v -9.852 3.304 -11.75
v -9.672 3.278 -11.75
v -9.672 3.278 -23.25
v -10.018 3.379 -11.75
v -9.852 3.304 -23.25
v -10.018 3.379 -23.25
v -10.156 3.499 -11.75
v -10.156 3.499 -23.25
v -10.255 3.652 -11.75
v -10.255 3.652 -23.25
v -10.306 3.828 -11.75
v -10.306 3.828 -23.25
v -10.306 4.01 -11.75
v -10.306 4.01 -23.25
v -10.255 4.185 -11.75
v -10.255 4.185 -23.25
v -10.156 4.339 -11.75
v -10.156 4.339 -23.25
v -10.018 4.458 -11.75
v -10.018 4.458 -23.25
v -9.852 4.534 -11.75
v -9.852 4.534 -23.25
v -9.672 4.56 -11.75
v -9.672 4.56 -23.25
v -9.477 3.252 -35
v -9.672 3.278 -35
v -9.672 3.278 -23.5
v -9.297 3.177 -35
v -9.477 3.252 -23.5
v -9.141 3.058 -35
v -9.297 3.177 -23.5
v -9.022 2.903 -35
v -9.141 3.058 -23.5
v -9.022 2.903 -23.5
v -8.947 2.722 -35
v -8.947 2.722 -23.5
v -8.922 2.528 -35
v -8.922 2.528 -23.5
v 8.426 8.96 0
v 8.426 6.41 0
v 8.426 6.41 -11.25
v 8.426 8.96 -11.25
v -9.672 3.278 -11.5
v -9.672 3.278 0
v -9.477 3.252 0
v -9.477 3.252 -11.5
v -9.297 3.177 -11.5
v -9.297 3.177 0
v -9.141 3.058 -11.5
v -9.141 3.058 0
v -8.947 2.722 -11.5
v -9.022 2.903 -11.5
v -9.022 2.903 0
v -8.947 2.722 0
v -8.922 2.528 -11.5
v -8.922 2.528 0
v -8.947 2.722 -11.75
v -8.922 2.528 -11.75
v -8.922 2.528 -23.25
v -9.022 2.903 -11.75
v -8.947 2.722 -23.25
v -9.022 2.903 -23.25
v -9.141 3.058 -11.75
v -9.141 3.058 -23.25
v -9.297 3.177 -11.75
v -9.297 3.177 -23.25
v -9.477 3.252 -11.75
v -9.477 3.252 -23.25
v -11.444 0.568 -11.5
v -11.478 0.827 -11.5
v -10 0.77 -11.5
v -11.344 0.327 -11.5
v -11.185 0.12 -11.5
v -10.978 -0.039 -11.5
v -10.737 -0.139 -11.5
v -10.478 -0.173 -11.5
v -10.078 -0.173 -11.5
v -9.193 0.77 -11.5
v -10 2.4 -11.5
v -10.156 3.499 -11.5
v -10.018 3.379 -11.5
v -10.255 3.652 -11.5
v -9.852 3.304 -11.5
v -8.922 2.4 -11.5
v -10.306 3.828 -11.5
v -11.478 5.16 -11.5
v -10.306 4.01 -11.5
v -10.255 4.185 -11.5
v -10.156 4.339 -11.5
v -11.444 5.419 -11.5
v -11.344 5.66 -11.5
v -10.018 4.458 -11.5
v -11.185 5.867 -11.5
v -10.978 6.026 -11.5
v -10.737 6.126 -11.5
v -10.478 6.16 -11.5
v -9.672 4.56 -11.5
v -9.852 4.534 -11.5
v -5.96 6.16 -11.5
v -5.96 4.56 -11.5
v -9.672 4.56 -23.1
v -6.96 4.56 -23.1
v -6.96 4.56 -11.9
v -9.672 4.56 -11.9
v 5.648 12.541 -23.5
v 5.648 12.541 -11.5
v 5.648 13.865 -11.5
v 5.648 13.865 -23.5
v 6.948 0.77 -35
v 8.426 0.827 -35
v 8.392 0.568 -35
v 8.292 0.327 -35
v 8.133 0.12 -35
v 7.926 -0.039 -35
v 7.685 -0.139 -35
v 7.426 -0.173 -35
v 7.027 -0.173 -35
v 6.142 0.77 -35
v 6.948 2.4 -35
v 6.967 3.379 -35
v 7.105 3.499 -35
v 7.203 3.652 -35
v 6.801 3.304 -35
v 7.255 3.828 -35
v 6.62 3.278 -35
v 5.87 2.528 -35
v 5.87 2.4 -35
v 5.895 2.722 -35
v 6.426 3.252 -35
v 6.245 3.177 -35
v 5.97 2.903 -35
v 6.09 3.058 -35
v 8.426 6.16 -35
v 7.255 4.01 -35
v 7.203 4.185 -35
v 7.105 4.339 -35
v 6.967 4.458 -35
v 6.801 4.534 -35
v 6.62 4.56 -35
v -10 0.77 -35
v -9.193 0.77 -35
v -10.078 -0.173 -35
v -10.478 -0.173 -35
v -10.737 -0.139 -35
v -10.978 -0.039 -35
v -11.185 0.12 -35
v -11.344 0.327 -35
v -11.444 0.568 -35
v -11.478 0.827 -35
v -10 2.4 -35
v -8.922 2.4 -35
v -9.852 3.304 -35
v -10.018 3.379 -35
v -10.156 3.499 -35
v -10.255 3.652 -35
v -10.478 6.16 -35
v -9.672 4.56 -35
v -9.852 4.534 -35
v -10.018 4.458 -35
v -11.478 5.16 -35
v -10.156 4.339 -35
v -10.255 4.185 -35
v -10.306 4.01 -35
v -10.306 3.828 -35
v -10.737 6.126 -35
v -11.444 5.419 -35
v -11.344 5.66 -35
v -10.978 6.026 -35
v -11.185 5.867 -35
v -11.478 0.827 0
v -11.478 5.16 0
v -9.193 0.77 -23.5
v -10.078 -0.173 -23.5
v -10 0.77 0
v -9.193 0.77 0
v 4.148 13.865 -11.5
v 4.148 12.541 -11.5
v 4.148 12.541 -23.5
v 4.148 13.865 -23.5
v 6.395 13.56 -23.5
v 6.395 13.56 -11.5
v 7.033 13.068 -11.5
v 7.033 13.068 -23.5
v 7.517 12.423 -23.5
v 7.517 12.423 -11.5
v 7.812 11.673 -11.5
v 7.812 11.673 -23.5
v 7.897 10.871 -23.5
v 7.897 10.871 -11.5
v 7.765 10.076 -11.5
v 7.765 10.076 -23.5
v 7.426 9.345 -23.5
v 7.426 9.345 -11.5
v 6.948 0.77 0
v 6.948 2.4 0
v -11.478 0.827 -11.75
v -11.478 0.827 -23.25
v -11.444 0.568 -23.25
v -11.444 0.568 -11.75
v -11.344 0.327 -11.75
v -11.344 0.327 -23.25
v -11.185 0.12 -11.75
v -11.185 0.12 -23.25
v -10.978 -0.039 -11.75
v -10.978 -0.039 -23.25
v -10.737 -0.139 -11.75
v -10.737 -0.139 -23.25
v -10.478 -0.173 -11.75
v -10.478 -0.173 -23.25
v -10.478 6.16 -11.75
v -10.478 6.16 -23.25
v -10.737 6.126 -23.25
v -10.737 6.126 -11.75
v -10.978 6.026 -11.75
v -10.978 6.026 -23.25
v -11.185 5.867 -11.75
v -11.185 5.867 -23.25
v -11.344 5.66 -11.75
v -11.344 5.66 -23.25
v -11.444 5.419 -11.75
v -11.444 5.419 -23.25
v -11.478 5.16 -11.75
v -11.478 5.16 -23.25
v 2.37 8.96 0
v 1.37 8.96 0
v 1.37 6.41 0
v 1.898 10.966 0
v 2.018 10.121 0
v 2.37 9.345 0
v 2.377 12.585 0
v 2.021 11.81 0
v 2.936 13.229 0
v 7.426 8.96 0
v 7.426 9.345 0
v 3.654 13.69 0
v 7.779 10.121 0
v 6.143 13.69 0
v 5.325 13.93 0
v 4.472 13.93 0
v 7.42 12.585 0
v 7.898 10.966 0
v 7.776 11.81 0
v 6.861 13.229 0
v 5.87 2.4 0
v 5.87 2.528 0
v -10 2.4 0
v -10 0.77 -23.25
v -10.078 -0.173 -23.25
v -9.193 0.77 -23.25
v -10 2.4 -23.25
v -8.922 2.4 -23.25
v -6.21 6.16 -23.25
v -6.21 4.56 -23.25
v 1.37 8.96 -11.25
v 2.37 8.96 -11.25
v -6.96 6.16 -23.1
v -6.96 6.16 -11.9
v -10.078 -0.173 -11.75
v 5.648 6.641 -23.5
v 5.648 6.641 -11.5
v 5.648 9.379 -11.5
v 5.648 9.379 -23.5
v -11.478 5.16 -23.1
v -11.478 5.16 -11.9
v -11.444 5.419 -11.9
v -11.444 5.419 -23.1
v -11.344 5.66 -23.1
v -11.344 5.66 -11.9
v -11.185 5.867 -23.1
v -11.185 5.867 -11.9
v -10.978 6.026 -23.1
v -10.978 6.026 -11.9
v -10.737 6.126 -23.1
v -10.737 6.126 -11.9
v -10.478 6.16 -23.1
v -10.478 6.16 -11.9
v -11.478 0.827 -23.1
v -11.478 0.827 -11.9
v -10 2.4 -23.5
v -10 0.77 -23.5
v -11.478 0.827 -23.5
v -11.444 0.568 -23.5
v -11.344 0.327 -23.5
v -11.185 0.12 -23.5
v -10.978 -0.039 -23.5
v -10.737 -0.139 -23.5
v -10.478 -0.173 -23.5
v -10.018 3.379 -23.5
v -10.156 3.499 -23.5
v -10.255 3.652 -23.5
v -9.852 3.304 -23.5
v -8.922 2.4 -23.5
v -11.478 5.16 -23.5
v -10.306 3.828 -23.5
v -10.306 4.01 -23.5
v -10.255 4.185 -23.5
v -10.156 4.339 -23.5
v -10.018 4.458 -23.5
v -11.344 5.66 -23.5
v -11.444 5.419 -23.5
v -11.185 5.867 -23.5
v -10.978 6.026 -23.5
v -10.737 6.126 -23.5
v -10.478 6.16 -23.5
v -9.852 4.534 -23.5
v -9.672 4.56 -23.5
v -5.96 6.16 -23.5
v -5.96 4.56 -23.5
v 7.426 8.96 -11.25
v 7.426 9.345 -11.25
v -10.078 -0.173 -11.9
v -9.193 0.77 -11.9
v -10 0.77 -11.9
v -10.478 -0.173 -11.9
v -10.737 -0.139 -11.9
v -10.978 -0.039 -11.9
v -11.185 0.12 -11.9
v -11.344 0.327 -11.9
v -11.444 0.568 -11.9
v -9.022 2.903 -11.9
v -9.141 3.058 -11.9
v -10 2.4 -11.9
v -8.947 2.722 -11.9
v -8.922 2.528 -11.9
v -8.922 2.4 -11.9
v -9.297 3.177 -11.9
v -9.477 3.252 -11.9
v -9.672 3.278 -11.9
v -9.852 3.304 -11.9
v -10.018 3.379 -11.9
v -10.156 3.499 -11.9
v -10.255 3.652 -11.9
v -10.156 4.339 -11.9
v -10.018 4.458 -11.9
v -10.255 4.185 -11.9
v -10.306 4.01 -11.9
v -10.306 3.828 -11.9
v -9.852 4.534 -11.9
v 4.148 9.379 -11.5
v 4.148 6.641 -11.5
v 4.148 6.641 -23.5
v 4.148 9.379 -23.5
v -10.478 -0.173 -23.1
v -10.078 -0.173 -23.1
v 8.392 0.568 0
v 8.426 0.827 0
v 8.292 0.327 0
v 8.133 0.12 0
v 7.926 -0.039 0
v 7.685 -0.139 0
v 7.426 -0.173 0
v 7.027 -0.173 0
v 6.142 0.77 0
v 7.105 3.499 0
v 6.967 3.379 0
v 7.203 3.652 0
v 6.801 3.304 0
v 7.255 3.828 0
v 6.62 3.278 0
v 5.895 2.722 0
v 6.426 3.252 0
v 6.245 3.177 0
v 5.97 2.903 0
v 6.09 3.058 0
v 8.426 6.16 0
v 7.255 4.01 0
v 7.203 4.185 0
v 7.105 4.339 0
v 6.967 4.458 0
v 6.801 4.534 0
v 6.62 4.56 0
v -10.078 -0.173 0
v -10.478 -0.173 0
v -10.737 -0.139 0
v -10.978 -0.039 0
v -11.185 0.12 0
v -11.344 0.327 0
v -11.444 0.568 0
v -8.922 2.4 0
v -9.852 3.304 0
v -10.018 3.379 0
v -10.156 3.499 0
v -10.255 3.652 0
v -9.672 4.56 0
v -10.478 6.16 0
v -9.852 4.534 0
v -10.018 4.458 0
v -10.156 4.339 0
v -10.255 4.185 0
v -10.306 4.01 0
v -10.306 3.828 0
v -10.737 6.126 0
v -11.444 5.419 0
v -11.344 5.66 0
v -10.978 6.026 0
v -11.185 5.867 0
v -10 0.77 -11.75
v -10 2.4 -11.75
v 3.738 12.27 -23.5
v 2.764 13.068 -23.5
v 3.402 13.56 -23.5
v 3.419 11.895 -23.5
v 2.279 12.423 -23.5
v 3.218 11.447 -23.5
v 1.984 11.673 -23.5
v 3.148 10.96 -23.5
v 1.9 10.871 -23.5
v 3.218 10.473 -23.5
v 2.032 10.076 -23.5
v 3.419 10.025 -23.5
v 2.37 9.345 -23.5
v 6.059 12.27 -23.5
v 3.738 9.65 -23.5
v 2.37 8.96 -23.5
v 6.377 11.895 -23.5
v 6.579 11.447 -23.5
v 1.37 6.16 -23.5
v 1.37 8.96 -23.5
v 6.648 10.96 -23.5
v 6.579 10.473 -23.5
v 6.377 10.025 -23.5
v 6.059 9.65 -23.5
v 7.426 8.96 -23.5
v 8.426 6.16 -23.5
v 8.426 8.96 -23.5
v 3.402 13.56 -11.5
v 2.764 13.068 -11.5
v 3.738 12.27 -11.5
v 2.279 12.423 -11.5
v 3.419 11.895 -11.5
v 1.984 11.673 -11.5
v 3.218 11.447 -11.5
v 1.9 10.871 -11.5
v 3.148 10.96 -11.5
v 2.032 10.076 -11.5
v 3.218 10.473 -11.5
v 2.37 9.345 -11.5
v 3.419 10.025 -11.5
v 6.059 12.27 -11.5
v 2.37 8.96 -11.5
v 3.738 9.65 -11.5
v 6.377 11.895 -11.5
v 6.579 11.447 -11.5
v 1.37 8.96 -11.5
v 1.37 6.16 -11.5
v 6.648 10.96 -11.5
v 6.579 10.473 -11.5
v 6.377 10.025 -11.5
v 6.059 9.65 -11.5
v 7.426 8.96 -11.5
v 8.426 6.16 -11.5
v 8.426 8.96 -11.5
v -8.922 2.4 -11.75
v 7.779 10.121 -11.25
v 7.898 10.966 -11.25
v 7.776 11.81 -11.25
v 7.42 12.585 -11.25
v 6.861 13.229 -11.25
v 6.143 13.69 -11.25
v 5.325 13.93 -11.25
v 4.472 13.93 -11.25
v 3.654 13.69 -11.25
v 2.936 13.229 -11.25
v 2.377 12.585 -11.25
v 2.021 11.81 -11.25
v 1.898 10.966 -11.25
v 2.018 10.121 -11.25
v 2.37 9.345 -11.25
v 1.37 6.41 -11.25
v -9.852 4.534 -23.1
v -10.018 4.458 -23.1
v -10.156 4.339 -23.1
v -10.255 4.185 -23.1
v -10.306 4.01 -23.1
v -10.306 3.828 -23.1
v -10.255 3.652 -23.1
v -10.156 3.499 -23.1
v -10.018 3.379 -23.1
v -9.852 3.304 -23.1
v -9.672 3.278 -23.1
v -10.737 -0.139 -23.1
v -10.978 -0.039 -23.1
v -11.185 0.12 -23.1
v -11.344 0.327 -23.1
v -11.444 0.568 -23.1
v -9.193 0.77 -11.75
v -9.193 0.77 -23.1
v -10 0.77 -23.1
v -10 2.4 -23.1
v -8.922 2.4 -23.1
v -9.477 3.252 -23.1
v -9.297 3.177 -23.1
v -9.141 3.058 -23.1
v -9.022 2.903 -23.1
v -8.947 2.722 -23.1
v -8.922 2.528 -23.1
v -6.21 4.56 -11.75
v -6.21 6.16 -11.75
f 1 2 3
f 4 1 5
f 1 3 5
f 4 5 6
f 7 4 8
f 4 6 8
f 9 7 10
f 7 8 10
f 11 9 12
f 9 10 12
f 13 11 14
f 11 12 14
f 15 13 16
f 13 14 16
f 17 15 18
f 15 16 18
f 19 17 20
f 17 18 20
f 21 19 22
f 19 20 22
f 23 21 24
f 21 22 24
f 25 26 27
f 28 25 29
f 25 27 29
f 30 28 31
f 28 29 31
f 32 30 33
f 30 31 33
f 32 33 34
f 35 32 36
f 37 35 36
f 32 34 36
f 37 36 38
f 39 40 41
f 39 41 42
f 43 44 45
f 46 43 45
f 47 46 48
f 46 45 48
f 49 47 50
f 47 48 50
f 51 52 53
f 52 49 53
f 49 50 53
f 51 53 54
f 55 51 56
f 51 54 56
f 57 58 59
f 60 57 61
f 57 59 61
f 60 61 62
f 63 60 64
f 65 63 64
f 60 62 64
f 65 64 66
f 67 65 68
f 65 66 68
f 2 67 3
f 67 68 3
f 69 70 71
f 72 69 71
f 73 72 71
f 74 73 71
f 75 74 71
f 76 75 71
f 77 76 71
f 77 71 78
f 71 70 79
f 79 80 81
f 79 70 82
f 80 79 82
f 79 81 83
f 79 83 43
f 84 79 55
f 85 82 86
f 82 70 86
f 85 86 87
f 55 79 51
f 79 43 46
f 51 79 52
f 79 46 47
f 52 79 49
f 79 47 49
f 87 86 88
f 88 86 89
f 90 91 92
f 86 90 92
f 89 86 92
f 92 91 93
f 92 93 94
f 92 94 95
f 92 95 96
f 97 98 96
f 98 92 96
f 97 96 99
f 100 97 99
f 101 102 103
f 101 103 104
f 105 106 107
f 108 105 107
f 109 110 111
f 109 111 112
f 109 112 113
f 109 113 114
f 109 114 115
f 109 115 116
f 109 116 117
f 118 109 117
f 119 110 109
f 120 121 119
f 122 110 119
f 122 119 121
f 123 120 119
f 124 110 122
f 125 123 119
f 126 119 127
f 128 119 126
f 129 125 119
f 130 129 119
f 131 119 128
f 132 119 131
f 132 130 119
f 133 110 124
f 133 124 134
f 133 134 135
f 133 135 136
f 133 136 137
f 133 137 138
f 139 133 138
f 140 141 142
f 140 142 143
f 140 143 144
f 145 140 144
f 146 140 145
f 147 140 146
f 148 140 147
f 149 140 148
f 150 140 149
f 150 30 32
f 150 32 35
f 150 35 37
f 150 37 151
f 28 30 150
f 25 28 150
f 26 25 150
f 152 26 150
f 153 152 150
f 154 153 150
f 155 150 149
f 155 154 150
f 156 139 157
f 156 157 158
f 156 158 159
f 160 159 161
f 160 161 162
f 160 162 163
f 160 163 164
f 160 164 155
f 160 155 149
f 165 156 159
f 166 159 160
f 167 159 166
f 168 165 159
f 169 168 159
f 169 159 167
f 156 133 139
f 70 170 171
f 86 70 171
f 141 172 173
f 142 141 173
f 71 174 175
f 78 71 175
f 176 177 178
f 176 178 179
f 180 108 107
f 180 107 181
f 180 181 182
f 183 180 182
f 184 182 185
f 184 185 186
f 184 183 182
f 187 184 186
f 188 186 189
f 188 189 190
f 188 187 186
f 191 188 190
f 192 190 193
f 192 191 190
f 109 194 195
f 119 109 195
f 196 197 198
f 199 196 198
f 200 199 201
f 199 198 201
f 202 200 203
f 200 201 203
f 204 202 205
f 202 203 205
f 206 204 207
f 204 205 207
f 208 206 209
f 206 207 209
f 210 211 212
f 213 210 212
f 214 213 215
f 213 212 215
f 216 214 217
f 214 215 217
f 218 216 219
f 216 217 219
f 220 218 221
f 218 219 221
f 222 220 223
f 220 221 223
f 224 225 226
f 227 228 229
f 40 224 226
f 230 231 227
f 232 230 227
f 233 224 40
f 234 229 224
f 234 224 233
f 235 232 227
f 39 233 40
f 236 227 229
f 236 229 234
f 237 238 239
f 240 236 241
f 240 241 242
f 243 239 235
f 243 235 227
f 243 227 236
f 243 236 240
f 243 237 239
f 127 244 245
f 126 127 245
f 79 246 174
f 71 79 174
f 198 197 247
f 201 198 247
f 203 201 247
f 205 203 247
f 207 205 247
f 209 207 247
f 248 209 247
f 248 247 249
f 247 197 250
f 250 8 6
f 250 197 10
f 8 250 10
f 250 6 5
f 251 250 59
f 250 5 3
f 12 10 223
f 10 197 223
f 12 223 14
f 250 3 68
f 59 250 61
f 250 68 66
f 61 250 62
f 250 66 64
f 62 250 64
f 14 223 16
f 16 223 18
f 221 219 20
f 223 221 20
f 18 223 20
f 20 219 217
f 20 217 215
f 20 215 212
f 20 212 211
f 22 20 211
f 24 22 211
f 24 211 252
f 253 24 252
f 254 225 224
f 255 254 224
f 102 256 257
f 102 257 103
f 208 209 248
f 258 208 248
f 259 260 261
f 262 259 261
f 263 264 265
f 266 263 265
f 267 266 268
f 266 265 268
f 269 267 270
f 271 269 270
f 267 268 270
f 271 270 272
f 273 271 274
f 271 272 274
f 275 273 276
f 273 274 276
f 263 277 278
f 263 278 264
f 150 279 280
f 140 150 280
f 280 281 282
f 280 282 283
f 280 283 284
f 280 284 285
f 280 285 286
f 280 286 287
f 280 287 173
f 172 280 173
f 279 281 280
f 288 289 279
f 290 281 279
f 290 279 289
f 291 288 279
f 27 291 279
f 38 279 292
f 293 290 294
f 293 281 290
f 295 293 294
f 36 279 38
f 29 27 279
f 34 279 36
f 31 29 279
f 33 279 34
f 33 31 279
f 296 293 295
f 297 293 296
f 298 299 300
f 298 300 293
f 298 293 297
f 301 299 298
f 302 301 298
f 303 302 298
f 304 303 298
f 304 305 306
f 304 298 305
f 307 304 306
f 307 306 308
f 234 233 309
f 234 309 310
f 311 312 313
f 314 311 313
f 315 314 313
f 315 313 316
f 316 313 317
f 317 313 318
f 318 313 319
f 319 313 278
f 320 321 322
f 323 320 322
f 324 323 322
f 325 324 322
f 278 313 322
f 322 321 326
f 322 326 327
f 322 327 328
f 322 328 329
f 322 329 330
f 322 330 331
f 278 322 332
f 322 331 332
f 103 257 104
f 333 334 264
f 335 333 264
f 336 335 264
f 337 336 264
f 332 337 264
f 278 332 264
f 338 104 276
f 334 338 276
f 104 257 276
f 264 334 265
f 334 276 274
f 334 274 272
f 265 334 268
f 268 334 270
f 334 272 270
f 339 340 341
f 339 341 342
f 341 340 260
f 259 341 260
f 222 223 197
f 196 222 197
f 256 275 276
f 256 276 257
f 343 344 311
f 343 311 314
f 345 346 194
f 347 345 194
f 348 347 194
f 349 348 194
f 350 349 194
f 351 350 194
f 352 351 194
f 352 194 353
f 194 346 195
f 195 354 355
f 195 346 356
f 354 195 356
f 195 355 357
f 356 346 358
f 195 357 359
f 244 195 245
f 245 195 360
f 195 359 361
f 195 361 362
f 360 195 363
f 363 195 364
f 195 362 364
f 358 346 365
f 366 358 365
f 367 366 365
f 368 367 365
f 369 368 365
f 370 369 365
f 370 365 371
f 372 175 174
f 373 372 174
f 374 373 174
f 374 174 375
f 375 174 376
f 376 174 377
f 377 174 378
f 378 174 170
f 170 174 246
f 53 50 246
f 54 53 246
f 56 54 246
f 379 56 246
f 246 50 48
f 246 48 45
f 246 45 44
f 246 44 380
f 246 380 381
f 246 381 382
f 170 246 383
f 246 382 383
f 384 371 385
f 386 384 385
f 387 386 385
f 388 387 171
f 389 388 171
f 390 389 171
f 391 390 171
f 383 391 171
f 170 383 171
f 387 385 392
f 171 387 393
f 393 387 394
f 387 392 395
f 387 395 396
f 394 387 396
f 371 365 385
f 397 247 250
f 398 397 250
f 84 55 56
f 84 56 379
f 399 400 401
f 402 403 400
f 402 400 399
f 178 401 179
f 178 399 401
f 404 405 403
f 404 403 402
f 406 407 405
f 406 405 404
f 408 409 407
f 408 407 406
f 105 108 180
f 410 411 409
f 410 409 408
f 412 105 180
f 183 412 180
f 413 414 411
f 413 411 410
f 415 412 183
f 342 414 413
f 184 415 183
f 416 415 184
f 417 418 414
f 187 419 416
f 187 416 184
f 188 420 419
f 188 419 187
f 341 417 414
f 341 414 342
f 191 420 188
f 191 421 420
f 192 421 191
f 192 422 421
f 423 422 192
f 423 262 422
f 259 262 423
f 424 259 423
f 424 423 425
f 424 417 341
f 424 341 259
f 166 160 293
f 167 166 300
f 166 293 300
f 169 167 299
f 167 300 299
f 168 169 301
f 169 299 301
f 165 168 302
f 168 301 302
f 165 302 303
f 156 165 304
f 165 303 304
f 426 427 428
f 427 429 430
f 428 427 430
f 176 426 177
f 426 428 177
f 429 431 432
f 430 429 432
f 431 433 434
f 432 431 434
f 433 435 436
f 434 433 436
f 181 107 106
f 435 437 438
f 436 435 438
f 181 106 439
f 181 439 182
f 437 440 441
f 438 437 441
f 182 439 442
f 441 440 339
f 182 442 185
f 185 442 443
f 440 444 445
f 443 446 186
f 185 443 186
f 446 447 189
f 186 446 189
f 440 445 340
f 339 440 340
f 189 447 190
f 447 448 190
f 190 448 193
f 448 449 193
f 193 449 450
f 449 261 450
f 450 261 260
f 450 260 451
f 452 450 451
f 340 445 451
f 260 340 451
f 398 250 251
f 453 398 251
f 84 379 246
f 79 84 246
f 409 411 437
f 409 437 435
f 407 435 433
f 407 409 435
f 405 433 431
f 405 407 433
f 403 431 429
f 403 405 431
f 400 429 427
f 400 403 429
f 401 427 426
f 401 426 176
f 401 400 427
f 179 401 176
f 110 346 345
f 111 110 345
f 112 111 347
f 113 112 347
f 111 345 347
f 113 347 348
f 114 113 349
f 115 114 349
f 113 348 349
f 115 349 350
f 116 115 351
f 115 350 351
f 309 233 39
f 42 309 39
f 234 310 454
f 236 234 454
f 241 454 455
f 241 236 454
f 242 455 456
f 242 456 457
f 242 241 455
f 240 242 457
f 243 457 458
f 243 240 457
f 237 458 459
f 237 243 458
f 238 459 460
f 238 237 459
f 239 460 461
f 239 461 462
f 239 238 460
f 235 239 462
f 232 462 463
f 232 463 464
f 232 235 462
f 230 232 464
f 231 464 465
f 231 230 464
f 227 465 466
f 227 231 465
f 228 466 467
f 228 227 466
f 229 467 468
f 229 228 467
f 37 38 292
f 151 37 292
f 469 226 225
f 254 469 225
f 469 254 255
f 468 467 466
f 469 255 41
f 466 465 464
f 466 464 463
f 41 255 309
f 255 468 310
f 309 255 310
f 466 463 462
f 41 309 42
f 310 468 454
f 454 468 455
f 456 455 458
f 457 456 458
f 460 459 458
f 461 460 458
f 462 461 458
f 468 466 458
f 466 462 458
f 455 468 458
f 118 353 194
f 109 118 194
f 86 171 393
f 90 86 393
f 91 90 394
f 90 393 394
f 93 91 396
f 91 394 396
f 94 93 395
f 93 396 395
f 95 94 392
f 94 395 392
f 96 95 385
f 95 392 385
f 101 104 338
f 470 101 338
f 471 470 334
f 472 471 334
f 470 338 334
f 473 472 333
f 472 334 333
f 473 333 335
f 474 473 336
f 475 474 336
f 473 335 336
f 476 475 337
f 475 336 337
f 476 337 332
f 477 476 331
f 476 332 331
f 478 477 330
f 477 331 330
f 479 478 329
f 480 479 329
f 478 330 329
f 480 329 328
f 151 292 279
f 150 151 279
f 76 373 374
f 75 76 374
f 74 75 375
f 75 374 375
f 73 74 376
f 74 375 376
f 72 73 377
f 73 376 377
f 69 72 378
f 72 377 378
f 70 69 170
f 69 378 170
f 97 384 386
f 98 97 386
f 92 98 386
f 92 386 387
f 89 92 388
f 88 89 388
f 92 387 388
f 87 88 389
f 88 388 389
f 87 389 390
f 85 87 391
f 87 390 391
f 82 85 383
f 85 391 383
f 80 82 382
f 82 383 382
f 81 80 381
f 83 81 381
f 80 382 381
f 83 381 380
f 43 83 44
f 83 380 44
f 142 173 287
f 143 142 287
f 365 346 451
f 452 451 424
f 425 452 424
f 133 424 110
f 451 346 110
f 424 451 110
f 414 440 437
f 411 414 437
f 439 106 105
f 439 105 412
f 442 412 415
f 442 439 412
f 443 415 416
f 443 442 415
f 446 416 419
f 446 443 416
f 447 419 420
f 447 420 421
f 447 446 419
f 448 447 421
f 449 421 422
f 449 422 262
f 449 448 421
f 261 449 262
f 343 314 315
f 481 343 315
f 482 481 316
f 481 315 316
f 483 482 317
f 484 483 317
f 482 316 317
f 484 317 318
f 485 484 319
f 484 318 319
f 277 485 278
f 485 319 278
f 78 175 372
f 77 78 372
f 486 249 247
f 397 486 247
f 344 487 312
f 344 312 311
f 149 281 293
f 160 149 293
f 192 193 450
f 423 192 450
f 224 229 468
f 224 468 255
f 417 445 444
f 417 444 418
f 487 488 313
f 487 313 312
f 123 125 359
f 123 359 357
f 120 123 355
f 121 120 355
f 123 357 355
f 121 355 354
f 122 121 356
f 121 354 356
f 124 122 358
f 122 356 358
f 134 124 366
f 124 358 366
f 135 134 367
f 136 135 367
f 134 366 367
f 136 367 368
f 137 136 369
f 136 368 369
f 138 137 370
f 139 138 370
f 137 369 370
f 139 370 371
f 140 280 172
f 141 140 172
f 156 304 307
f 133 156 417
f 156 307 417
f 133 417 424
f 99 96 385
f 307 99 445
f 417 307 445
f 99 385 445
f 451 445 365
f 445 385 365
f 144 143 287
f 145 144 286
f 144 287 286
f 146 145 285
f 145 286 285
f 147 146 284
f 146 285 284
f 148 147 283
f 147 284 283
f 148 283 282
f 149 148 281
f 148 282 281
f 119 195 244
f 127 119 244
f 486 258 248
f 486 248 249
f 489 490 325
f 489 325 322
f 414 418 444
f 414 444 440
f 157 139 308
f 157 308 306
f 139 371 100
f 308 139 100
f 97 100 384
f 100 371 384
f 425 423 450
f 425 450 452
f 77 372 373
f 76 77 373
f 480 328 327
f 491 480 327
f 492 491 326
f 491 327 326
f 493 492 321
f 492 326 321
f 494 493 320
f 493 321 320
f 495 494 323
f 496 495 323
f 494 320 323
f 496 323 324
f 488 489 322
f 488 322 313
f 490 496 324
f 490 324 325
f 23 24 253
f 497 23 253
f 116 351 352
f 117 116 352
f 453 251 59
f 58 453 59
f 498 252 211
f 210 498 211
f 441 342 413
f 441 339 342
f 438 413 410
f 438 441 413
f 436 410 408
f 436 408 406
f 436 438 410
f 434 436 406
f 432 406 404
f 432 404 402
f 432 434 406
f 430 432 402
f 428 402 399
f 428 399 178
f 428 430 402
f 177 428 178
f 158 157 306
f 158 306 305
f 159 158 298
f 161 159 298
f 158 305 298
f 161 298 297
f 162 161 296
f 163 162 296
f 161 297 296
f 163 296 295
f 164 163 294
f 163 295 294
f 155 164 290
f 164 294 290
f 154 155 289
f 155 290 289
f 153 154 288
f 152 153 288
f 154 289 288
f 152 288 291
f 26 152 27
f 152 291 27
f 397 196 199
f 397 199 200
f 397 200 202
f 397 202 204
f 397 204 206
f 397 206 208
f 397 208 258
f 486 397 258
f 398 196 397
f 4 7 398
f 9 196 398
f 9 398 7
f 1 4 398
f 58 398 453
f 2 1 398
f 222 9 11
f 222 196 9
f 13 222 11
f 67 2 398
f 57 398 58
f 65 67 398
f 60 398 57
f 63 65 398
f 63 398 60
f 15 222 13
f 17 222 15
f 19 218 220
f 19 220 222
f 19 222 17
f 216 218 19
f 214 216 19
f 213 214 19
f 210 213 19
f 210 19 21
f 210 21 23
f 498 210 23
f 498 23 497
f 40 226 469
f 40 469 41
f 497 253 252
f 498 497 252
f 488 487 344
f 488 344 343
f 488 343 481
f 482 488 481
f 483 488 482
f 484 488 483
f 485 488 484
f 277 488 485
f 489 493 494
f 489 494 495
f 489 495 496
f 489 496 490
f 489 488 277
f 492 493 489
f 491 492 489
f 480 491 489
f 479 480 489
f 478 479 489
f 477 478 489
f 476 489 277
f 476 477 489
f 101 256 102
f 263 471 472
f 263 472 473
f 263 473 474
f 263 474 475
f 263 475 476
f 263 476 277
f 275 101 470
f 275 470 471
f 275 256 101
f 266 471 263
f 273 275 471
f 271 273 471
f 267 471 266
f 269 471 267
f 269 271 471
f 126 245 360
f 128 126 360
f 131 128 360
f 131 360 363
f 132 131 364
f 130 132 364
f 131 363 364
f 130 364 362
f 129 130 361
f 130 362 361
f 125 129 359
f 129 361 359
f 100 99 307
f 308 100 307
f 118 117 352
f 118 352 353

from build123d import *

# Parameters (mm, degrees)
BOSS_EXTRUDE1_DEPTH  = 35
SKETCH2_R            = 1.75
BOSS_EXTRUDE2_DEPTH  = 6
SKETCH3_W            = 6.827847706
SKETCH3_H            = 12
CUT_EXTRUDE1_DEPTH   = 38.650819755
BOSS_EXTRUDE9_DEPTH  = 11.25
BOSS_EXTRUDE5_START  = 11.6
BOSS_EXTRUDE5_DEPTH  = 11.2
SKETCH7_W            = 1
SKETCH7_H            = 12
BOSS_EXTRUDE6_DEPTH  = 2.8
BOSS_EXTRUDE8_DEPTH  = 11.5
SKETCH10_W           = 1.5
SKETCH10_H           = 15.807669909
CUT_EXTRUDE2_DEPTH   = 12
SKETCH11_W           = 7.055900531
SKETCH11_H           = 2.55
BOSS_EXTRUDE10_DEPTH = 11.25


with BuildPart() as part:
    # Sketch1 → Boss-Extrude1 (new body)
    with BuildSketch(Plane.XY):
        with BuildLine():
            Line((-10, 0.77), (-9.193488643, 0.77))
            Line((-9.193488643, 0.77), (-10.078279759, -0.173227408))
            Line((-10.078279759, -0.173227408), (-10.477988856, -0.173227408))
            ThreePointArc((-10.477988856, -0.173227408), (-11.185095638, 0.119665811), (-11.477988856, 0.826772592))
            Line((-11.477988856, 0.826772592), (-11.477988856, 5.16))
            ThreePointArc((-11.477988856, 5.16), (-11.185095638, 5.867106781), (-10.477988856, 6.16))
            Line((-10.477988856, 6.16), (7.42638243, 6.16))
            Line((7.42638243, 6.16), (8.42638243, 6.16))
            Line((8.42638243, 6.16), (8.42638243, 5.16))
            Line((8.42638243, 5.16), (8.42638243, 0.826772592))
            ThreePointArc((8.42638243, 0.826772592), (8.133489211, 0.119665811), (7.42638243, -0.173227408))
            Line((7.42638243, -0.173227408), (7.026673332, -0.173227408))
            Line((7.026673332, -0.173227408), (6.141882217, 0.77))
            Line((6.141882217, 0.77), (6.948393574, 0.77))
            Line((6.948393574, 0.77), (6.948393574, 2.4))
            Line((6.948393574, 2.4), (5.869926753, 2.4))
            Line((5.869926753, 2.4), (5.869926753, 2.527601685))
            ThreePointArc((5.869926753, 2.527601685), (6.089596667, 3.05793177), (6.619926753, 3.277601685))
            ThreePointArc((6.619926753, 3.277601685), (7.261125911, 3.918800842), (6.619926753, 4.56))
            Line((6.619926753, 4.56), (-9.671533179, 4.56))
            ThreePointArc((-9.671533179, 4.56), (-10.312732337, 3.918800842), (-9.671533179, 3.277601685))
            ThreePointArc((-9.671533179, 3.277601685), (-9.141203094, 3.05793177), (-8.921533179, 2.527601685))
            Line((-8.921533179, 2.527601685), (-8.921533179, 2.4))
            Line((-8.921533179, 2.4), (-10, 2.4))
            Line((-10, 2.4), (-10, 0.77))
        make_face()
    extrude(amount=-BOSS_EXTRUDE1_DEPTH)

    # Sketch2 → Boss-Extrude2 (add, symmetric)
    with BuildSketch(Plane(origin=(0, 0, -17.5), x_dir=(-1, 0, 0), z_dir=(0, 0, -1))):
        with BuildLine():
            Line((-7.42638243, 6.16), (-2.370481899, 6.16))
            Line((-2.370481899, 6.16), (-2.370481899, 9.344615385))
            ThreePointArc((-2.370481899, 9.344615385), (-4.898432165, 13.96), (-7.42638243, 9.344615385))
            Line((-7.42638243, 9.344615385), (-7.42638243, 6.16))
        make_face()
        with Locations((-4.898432165, 10.96)):
            Circle(SKETCH2_R, mode=Mode.SUBTRACT)
    extrude(amount=BOSS_EXTRUDE2_DEPTH, both=True)

    # Sketch3 → Cut-Extrude1 (cut, through all)
    with BuildSketch(Plane(origin=(0, 6.16, 0), x_dir=(1, 0, 0), z_dir=(0, 1, 0))):
        with Locations((-9.373923853, 17.5)):
            Rectangle(SKETCH3_W, SKETCH3_H)
    extrude(amount=-CUT_EXTRUDE1_DEPTH, mode=Mode.SUBTRACT)

    # Sketch7 → Boss-Extrude6 (add)
    with BuildSketch(Plane(origin=(0, 6.16, 0), x_dir=(1, 0, 0), z_dir=(0, 1, 0))):
        with Locations((7.92638243, 17.5)):
            Rectangle(SKETCH7_W, SKETCH7_H)
        with Locations((1.870481899, 17.5)):
            Rectangle(SKETCH7_W, SKETCH7_H)
    extrude(amount=BOSS_EXTRUDE6_DEPTH)

    # Sketch10 → Cut-Extrude2 (cut)
    with BuildSketch(Plane.XY.offset(-11.5)):
        with Locations((4.898432165, 14.544608337)):
            Rectangle(SKETCH10_W, SKETCH10_H)
    extrude(amount=-CUT_EXTRUDE2_DEPTH, mode=Mode.SUBTRACT)


with BuildPart() as body_2:
    # Sketch4 → Boss-Extrude9 (new body)
    with BuildSketch(Plane.XY):
        with BuildLine():
            Line((7.42638243, 6.41), (7.42638243, 9.344615385))
            ThreePointArc((7.42638243, 9.344615385), (4.898432165, 13.96), (2.370481899, 9.344615385))
            Line((2.370481899, 9.344615385), (2.370481899, 6.41))
            Line((2.370481899, 6.41), (7.42638243, 6.41))
        make_face()
    extrude(amount=-BOSS_EXTRUDE9_DEPTH)

    # Sketch11 → Boss-Extrude10 (add)
    with BuildSketch(Plane.XY):
        with Locations((4.898432164, 7.685)):
            Rectangle(SKETCH11_W, SKETCH11_H)
    extrude(amount=-BOSS_EXTRUDE10_DEPTH)


with BuildPart() as body_3:
    # Sketch6 → Boss-Extrude5 (new body)
    with BuildSketch(Plane.XY.offset(-23.5).offset(BOSS_EXTRUDE5_START)):
        with BuildLine():
            Line((-6.96, 6.16), (-6.96, 4.56))
            Line((-6.96, 4.56), (-9.671533179, 4.56))
            ThreePointArc((-9.671533179, 4.56), (-10.312732337, 3.918800842), (-9.671533179, 3.277601685))
            ThreePointArc((-9.671533179, 3.277601685), (-9.141203094, 3.05793177), (-8.921533179, 2.527601685))
            Line((-8.921533179, 2.527601685), (-8.921533179, 2.4))
            Line((-8.921533179, 2.4), (-10, 2.4))
            Line((-10, 2.4), (-10, 0.77))
            Line((-10, 0.77), (-9.193488643, 0.77))
            Line((-9.193488643, 0.77), (-10.078279759, -0.173227408))
            Line((-10.078279759, -0.173227408), (-10.477988856, -0.173227408))
            ThreePointArc((-10.477988856, -0.173227408), (-11.185095638, 0.119665811), (-11.477988856, 0.826772592))
            Line((-11.477988856, 0.826772592), (-11.477988856, 5.16))
            ThreePointArc((-11.477988856, 5.16), (-11.185095638, 5.867106781), (-10.477988856, 6.16))
            Line((-10.477988856, 6.16), (-6.96, 6.16))
        make_face()
    extrude(amount=-BOSS_EXTRUDE5_DEPTH)


with BuildPart() as body_4:
    # Sketch9 → Boss-Extrude8 (new body)
    with BuildSketch(Plane.XY.offset(-23.25)):
        with BuildLine():
            Line((-6.21, 6.16), (-10.477988856, 6.16))
            ThreePointArc((-10.477988856, 6.16), (-11.185095638, 5.867106781), (-11.477988856, 5.16))
            Line((-11.477988856, 5.16), (-11.477988856, 0.826772592))
            ThreePointArc((-11.477988856, 0.826772592), (-11.185095638, 0.119665811), (-10.477988856, -0.173227408))
            Line((-10.477988856, -0.173227408), (-10.078279759, -0.173227408))
            Line((-10.078279759, -0.173227408), (-9.193488643, 0.77))
            Line((-9.193488643, 0.77), (-10, 0.77))
            Line((-10, 0.77), (-10, 2.4))
            Line((-10, 2.4), (-8.921533179, 2.4))
            Line((-8.921533179, 2.4), (-8.921533179, 2.527601685))
            ThreePointArc((-8.921533179, 2.527601685), (-9.141203094, 3.05793177), (-9.671533179, 3.277601685))
            ThreePointArc((-9.671533179, 3.277601685), (-10.312732337, 3.918800842), (-9.671533179, 4.56))
            Line((-9.671533179, 4.56), (-6.21, 4.56))
            Line((-6.21, 4.56), (-6.21, 6.16))
        make_face()
    extrude(amount=BOSS_EXTRUDE8_DEPTH)


solid = Compound([part.part, body_2.part, body_3.part, body_4.part])
